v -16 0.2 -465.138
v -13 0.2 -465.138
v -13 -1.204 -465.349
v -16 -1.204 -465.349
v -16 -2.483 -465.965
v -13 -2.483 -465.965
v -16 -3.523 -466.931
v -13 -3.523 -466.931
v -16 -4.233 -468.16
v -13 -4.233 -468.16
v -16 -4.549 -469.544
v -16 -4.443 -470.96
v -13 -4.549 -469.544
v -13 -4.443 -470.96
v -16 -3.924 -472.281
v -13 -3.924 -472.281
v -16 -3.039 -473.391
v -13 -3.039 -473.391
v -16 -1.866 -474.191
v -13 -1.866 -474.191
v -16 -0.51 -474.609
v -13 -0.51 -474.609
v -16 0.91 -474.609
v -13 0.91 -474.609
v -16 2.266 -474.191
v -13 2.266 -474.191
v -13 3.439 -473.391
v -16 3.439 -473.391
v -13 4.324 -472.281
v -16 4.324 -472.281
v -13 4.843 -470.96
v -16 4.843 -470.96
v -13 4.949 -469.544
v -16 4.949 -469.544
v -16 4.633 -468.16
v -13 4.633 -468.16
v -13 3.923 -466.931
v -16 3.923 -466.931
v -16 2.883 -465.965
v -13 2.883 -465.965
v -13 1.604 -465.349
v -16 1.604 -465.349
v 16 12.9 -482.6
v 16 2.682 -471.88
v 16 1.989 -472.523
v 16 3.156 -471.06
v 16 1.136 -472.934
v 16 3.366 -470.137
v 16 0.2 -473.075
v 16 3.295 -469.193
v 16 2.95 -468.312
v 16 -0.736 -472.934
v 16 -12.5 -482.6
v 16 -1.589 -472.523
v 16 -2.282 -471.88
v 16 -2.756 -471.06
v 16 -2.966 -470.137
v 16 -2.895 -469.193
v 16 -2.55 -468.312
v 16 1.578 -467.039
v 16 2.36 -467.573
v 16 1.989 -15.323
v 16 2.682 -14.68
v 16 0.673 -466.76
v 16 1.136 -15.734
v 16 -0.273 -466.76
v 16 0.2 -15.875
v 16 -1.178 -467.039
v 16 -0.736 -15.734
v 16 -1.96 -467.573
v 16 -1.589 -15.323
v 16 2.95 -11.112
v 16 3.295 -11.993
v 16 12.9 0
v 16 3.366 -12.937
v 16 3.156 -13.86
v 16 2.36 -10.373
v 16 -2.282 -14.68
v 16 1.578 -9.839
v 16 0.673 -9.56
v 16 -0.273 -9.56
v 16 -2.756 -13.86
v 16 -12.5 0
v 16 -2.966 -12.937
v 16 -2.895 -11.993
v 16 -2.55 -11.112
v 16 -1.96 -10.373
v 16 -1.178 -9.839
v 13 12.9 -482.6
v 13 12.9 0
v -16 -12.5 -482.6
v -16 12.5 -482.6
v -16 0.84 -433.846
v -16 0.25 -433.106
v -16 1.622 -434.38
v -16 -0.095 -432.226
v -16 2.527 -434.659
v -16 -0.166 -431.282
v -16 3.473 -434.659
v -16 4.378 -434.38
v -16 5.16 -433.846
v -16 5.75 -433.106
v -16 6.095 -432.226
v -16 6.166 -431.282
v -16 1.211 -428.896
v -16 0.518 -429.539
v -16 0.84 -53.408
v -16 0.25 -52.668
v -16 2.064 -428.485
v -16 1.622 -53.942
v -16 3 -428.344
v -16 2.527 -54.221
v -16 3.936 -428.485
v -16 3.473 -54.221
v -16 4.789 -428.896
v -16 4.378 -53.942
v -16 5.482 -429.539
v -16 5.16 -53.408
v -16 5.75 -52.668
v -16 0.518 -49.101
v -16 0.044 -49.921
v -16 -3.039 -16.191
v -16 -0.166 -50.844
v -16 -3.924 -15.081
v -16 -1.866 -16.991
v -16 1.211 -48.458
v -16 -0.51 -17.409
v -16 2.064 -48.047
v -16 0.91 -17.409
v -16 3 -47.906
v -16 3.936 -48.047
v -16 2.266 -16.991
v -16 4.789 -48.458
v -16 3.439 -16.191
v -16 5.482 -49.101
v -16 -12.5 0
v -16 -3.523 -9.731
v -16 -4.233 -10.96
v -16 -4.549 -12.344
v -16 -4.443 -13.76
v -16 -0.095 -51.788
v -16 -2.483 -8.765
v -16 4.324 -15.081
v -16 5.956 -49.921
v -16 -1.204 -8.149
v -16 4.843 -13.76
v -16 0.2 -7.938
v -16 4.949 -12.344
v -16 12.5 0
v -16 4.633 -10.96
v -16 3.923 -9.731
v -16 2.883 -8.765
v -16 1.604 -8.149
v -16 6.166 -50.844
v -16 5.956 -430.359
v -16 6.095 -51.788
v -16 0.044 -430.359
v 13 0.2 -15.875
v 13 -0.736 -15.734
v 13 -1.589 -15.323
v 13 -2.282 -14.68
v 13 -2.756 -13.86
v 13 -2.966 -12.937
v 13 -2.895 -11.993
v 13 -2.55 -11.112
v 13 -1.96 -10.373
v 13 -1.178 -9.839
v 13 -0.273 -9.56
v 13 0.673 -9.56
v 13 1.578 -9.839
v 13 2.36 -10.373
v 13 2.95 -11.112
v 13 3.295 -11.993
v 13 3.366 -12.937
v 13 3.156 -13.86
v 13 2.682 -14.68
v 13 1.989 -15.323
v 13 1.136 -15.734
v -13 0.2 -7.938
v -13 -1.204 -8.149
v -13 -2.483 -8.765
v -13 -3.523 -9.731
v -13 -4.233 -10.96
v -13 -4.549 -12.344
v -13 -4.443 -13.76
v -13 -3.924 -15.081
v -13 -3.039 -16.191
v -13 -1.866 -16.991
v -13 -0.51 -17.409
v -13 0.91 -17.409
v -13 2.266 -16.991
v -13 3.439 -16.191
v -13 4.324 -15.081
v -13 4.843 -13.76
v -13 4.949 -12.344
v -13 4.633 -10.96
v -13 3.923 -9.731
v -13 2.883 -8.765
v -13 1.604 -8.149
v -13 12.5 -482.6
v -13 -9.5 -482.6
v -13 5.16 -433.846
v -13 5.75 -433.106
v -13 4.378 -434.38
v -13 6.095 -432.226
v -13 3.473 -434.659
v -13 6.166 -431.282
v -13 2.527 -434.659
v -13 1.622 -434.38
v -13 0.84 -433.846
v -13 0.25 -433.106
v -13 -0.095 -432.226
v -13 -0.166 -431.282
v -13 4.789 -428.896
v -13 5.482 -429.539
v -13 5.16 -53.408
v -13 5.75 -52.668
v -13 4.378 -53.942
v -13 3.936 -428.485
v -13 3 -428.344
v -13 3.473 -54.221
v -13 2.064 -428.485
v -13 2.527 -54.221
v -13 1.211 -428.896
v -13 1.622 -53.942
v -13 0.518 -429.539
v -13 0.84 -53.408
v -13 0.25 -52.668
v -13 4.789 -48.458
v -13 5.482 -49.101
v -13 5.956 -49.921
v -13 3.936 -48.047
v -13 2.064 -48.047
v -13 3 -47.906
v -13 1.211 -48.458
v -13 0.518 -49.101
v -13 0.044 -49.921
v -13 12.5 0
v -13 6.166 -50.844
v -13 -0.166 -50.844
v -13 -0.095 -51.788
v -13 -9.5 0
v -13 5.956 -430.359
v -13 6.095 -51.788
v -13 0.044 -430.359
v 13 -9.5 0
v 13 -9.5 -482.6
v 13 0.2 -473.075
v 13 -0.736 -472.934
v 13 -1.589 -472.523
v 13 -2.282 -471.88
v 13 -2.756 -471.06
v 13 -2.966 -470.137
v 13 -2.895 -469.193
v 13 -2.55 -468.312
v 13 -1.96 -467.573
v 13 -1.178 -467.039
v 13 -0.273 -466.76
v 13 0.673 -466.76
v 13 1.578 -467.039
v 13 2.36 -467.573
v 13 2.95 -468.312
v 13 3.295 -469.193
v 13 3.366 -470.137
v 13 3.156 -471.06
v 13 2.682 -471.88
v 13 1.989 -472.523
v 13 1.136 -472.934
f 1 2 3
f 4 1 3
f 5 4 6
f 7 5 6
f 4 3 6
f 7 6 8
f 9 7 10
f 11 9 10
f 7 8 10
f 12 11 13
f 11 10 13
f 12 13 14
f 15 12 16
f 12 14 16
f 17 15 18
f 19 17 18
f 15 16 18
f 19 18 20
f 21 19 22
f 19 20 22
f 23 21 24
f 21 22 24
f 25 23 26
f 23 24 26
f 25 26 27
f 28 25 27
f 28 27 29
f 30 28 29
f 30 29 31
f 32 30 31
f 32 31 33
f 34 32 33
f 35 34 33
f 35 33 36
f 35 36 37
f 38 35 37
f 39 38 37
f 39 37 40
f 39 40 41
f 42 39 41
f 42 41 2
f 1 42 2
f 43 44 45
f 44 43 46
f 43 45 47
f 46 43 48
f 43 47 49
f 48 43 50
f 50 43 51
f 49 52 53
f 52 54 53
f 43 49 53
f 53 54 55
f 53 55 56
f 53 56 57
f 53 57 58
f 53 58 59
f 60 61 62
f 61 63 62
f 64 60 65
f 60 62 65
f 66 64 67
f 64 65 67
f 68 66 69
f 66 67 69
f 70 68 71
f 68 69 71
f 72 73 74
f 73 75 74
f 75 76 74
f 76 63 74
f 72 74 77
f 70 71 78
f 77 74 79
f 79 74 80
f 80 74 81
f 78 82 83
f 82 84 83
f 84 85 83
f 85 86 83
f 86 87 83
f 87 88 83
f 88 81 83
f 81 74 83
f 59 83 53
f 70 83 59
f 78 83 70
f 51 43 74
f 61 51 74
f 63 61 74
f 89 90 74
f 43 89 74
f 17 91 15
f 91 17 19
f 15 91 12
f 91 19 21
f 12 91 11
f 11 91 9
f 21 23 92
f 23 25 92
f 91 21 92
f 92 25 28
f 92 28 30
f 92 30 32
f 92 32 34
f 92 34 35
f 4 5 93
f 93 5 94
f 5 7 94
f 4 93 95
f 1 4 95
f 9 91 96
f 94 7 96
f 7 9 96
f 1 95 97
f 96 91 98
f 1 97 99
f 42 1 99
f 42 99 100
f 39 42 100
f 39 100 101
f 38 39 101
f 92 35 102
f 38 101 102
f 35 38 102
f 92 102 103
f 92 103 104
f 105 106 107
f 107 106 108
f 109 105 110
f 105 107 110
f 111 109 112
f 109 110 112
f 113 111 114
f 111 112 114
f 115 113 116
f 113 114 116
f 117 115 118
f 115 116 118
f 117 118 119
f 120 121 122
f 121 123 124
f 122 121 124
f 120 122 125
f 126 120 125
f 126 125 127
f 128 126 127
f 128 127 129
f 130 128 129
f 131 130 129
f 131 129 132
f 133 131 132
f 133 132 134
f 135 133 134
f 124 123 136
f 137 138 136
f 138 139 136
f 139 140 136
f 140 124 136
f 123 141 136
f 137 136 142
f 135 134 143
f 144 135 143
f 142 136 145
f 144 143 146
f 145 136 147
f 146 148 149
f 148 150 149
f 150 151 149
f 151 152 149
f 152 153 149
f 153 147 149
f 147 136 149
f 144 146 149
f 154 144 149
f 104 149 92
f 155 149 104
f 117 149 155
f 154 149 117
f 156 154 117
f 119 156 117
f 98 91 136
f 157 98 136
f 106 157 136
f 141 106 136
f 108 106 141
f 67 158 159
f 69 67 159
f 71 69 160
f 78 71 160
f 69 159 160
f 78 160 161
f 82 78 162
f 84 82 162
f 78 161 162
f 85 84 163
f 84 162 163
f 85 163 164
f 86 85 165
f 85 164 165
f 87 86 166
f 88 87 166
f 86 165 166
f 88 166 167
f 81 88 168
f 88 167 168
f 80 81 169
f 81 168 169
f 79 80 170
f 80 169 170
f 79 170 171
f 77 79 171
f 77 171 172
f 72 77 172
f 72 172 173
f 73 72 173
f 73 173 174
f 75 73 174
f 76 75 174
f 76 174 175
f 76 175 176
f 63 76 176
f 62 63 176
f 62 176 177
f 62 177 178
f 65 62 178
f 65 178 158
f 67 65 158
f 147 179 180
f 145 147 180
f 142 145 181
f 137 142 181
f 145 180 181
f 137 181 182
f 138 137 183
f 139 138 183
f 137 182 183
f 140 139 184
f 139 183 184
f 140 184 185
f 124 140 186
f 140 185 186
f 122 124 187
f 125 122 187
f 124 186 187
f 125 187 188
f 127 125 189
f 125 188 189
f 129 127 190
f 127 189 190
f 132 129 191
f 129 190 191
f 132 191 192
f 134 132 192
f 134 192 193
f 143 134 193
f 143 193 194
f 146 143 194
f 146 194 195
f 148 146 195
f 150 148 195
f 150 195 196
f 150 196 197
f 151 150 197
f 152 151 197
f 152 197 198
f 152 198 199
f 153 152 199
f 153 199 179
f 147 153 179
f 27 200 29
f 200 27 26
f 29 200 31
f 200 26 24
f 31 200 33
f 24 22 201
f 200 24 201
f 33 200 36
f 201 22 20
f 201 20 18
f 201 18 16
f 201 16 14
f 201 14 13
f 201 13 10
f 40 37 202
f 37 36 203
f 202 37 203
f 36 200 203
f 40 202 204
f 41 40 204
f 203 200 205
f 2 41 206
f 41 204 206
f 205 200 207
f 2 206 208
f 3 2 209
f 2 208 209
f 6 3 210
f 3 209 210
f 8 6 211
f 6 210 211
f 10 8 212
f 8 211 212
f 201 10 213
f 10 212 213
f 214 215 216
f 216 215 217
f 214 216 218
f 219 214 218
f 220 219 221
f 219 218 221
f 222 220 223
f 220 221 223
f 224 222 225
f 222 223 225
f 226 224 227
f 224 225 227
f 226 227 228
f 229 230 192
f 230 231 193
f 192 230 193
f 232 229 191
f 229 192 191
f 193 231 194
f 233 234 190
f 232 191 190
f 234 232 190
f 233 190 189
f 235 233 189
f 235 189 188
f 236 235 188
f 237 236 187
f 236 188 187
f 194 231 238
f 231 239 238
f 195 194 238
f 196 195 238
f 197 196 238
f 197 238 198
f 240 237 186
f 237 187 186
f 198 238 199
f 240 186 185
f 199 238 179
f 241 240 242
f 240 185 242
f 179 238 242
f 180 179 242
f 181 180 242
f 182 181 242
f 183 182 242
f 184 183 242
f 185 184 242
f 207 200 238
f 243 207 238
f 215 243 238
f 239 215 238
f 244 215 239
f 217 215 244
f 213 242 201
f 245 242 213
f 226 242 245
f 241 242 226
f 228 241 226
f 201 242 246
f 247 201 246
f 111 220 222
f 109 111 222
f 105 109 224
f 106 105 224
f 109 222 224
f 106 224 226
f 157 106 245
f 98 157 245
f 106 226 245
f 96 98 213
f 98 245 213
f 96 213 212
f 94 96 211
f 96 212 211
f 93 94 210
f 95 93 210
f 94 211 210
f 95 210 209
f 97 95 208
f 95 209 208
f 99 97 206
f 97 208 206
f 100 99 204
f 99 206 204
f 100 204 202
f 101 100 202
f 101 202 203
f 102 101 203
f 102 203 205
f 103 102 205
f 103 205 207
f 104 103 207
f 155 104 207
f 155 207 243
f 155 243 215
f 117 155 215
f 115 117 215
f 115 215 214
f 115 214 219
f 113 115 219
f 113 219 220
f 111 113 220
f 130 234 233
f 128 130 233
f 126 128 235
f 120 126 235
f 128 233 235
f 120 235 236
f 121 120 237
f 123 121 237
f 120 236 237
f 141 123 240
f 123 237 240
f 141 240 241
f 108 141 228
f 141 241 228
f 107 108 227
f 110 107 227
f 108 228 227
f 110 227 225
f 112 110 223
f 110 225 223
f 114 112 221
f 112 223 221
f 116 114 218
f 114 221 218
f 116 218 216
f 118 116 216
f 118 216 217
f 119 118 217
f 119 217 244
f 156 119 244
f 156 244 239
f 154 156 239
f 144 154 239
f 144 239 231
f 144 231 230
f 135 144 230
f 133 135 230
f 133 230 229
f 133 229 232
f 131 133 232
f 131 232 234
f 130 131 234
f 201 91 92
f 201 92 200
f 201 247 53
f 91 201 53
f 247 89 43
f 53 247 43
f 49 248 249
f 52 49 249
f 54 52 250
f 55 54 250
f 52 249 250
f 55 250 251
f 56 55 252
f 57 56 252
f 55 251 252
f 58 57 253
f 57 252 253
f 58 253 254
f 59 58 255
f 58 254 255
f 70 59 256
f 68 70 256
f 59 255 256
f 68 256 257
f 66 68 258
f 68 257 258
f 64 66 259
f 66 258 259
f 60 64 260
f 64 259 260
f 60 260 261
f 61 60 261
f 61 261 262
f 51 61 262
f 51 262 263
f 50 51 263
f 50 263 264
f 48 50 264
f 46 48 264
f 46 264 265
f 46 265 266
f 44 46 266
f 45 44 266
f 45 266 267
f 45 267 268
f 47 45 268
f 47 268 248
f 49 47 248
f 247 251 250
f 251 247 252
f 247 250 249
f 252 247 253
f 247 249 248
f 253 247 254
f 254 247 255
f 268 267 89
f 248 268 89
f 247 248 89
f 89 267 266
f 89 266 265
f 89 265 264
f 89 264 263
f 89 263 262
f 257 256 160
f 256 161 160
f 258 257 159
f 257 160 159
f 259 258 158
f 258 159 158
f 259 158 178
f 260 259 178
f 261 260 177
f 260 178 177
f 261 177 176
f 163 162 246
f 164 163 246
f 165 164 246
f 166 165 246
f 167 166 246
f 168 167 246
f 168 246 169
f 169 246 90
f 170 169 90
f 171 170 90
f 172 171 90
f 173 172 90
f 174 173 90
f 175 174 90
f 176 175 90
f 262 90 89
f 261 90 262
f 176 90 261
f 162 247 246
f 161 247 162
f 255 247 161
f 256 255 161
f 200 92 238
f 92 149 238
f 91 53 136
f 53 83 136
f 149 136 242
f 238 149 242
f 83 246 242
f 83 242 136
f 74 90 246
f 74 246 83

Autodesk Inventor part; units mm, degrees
ref_plane "YZ Plane" through (0, 0, 0) normal (1, 0, 0) x (0, 1, 0)
ref_plane "XZ Plane" through (0, 0, 0) normal (0, 1, 0) x (-1, 0, 0)
ref_plane "XY Plane" through (0, 0, 0) normal (0, 0, 1) x (1, 0, 0)
sketch "Sketch1" plane through (0, 0, 0) normal (0, 0, 1) x (1, 0, 0)
  line L0 (-16, 12.5) -> (-13, 12.5)
  line L1 (-13, 12.5) -> (-13, -9.5)
  line L2 (-13, -9.5) -> (13, -9.5)
  line L3 (13, -9.5) -> (13, 12.9)
  line L4 (13, 12.9) -> (16, 12.9)
  line L5 (16, 12.9) -> (16, -12.5)
  line L6 (16, -12.5) -> (-16, -12.5)
  line L7 (-16, -12.5) -> (-16, 12.5)
  point P0 (0, 0)
  dimension "d0" = 3
  dimension "d2" = 3
  dimension "d3" = 25
  dimension "d4" = 32
  dimension "d5" = 16
  dimension "d7" = 12.5
  dimension "d8" = 3
extrude "Extrusion1" add sketch "Sketch1" against normal blind 482.6
sketch "Sketch4" plane through (16, -12.5, 0) normal (1, 0, 0) x (0, 0, -1)
  line L0 (0, 25.4) -> (0, 0) projected
  line L1 (482.6, 25.4) -> (482.6, 0) projected
  line L2 (0, 25.4) -> (482.6, 25.4) projected
  circle A0 centre (12.7, 12.7) radius 3.175
  circle A1 centre (469.9, 12.7) radius 3.175
  point P0 (0, 12.5)
  dimension "d21" = 6.35
  dimension "d24" = 12.7
  dimension "d26" = 12.7
  dimension "d27" = 6.35
  dimension "d28" = 12.7
  dimension "d29" = 12.7
hole "Mount Hole" at (16, 0.2, -12.7) at (16, 0.2, -469.9) direction (-1, 0, 0) diameter 6.35 depth 12.7 tip angle 118
sketch "Sketch5" plane through (-16, -12.5, 0) normal (-1, 0, 0) x (0, 0, 1)
  circle A0 centre (-12.7, 12.7) radius 3.175 projected
  circle A1 centre (-469.9, 12.7) radius 3.175 projected
  circle A2 centre (-469.9, 12.7) radius 4.7625
  circle A3 centre (-12.7, 12.7) radius 4.7625
  point P0 (0, 12.5)
  dimension "d37" = 9.525
  dimension "d38" = 9.525
hole "Access Hole" at (-16, 0.2, -469.9) at (-16, 0.2, -12.7) direction (1, 0, 0) diameter 9.525 depth 3 tip angle 118
sketch "Sketch6" plane through (-16, -12.5, 0) normal (-1, 0, 0) x (0, 0, 1)
  line L0 (0, 0) -> (0, 25) projected
  line L1 (-482.6, 0) -> (-482.6, 25) projected
  line L2 (0, 0) -> (-482.6, 0) projected
  circle A0 centre (-431.519, 15.5) radius 3.175
  circle A1 centre (-51.081, 15.5) radius 3.175
  point P0 (0, 12.5)
  dimension "d46" = 6.35
  dimension "d47" = 51.081
  dimension "d48" = 15.5
  dimension "d49" = 6.35
  dimension "d50" = 51.081
hole "Hole3" at (-16, 3, -431.519) at (-16, 3, -51.081) direction (1, 0, 0) diameter 6.35 depth 3 tip angle 118
equation "\"d2\" = d0"
equation "\"d5\" = 0.5 * d4"
equation "\"d7\" = 0.5 * d3"
equation "\"d8\" = d0"
equation "\"d24\" = d26"
equation "\"d27\" = d21"
equation "\"d28\" = d26"
equation "\"d29\" = d24"
equation "\"d35\" = d24"
equation "\"d38\" = d37"
equation "\"d50\" = d47"
properties part number "Rack - Back"
